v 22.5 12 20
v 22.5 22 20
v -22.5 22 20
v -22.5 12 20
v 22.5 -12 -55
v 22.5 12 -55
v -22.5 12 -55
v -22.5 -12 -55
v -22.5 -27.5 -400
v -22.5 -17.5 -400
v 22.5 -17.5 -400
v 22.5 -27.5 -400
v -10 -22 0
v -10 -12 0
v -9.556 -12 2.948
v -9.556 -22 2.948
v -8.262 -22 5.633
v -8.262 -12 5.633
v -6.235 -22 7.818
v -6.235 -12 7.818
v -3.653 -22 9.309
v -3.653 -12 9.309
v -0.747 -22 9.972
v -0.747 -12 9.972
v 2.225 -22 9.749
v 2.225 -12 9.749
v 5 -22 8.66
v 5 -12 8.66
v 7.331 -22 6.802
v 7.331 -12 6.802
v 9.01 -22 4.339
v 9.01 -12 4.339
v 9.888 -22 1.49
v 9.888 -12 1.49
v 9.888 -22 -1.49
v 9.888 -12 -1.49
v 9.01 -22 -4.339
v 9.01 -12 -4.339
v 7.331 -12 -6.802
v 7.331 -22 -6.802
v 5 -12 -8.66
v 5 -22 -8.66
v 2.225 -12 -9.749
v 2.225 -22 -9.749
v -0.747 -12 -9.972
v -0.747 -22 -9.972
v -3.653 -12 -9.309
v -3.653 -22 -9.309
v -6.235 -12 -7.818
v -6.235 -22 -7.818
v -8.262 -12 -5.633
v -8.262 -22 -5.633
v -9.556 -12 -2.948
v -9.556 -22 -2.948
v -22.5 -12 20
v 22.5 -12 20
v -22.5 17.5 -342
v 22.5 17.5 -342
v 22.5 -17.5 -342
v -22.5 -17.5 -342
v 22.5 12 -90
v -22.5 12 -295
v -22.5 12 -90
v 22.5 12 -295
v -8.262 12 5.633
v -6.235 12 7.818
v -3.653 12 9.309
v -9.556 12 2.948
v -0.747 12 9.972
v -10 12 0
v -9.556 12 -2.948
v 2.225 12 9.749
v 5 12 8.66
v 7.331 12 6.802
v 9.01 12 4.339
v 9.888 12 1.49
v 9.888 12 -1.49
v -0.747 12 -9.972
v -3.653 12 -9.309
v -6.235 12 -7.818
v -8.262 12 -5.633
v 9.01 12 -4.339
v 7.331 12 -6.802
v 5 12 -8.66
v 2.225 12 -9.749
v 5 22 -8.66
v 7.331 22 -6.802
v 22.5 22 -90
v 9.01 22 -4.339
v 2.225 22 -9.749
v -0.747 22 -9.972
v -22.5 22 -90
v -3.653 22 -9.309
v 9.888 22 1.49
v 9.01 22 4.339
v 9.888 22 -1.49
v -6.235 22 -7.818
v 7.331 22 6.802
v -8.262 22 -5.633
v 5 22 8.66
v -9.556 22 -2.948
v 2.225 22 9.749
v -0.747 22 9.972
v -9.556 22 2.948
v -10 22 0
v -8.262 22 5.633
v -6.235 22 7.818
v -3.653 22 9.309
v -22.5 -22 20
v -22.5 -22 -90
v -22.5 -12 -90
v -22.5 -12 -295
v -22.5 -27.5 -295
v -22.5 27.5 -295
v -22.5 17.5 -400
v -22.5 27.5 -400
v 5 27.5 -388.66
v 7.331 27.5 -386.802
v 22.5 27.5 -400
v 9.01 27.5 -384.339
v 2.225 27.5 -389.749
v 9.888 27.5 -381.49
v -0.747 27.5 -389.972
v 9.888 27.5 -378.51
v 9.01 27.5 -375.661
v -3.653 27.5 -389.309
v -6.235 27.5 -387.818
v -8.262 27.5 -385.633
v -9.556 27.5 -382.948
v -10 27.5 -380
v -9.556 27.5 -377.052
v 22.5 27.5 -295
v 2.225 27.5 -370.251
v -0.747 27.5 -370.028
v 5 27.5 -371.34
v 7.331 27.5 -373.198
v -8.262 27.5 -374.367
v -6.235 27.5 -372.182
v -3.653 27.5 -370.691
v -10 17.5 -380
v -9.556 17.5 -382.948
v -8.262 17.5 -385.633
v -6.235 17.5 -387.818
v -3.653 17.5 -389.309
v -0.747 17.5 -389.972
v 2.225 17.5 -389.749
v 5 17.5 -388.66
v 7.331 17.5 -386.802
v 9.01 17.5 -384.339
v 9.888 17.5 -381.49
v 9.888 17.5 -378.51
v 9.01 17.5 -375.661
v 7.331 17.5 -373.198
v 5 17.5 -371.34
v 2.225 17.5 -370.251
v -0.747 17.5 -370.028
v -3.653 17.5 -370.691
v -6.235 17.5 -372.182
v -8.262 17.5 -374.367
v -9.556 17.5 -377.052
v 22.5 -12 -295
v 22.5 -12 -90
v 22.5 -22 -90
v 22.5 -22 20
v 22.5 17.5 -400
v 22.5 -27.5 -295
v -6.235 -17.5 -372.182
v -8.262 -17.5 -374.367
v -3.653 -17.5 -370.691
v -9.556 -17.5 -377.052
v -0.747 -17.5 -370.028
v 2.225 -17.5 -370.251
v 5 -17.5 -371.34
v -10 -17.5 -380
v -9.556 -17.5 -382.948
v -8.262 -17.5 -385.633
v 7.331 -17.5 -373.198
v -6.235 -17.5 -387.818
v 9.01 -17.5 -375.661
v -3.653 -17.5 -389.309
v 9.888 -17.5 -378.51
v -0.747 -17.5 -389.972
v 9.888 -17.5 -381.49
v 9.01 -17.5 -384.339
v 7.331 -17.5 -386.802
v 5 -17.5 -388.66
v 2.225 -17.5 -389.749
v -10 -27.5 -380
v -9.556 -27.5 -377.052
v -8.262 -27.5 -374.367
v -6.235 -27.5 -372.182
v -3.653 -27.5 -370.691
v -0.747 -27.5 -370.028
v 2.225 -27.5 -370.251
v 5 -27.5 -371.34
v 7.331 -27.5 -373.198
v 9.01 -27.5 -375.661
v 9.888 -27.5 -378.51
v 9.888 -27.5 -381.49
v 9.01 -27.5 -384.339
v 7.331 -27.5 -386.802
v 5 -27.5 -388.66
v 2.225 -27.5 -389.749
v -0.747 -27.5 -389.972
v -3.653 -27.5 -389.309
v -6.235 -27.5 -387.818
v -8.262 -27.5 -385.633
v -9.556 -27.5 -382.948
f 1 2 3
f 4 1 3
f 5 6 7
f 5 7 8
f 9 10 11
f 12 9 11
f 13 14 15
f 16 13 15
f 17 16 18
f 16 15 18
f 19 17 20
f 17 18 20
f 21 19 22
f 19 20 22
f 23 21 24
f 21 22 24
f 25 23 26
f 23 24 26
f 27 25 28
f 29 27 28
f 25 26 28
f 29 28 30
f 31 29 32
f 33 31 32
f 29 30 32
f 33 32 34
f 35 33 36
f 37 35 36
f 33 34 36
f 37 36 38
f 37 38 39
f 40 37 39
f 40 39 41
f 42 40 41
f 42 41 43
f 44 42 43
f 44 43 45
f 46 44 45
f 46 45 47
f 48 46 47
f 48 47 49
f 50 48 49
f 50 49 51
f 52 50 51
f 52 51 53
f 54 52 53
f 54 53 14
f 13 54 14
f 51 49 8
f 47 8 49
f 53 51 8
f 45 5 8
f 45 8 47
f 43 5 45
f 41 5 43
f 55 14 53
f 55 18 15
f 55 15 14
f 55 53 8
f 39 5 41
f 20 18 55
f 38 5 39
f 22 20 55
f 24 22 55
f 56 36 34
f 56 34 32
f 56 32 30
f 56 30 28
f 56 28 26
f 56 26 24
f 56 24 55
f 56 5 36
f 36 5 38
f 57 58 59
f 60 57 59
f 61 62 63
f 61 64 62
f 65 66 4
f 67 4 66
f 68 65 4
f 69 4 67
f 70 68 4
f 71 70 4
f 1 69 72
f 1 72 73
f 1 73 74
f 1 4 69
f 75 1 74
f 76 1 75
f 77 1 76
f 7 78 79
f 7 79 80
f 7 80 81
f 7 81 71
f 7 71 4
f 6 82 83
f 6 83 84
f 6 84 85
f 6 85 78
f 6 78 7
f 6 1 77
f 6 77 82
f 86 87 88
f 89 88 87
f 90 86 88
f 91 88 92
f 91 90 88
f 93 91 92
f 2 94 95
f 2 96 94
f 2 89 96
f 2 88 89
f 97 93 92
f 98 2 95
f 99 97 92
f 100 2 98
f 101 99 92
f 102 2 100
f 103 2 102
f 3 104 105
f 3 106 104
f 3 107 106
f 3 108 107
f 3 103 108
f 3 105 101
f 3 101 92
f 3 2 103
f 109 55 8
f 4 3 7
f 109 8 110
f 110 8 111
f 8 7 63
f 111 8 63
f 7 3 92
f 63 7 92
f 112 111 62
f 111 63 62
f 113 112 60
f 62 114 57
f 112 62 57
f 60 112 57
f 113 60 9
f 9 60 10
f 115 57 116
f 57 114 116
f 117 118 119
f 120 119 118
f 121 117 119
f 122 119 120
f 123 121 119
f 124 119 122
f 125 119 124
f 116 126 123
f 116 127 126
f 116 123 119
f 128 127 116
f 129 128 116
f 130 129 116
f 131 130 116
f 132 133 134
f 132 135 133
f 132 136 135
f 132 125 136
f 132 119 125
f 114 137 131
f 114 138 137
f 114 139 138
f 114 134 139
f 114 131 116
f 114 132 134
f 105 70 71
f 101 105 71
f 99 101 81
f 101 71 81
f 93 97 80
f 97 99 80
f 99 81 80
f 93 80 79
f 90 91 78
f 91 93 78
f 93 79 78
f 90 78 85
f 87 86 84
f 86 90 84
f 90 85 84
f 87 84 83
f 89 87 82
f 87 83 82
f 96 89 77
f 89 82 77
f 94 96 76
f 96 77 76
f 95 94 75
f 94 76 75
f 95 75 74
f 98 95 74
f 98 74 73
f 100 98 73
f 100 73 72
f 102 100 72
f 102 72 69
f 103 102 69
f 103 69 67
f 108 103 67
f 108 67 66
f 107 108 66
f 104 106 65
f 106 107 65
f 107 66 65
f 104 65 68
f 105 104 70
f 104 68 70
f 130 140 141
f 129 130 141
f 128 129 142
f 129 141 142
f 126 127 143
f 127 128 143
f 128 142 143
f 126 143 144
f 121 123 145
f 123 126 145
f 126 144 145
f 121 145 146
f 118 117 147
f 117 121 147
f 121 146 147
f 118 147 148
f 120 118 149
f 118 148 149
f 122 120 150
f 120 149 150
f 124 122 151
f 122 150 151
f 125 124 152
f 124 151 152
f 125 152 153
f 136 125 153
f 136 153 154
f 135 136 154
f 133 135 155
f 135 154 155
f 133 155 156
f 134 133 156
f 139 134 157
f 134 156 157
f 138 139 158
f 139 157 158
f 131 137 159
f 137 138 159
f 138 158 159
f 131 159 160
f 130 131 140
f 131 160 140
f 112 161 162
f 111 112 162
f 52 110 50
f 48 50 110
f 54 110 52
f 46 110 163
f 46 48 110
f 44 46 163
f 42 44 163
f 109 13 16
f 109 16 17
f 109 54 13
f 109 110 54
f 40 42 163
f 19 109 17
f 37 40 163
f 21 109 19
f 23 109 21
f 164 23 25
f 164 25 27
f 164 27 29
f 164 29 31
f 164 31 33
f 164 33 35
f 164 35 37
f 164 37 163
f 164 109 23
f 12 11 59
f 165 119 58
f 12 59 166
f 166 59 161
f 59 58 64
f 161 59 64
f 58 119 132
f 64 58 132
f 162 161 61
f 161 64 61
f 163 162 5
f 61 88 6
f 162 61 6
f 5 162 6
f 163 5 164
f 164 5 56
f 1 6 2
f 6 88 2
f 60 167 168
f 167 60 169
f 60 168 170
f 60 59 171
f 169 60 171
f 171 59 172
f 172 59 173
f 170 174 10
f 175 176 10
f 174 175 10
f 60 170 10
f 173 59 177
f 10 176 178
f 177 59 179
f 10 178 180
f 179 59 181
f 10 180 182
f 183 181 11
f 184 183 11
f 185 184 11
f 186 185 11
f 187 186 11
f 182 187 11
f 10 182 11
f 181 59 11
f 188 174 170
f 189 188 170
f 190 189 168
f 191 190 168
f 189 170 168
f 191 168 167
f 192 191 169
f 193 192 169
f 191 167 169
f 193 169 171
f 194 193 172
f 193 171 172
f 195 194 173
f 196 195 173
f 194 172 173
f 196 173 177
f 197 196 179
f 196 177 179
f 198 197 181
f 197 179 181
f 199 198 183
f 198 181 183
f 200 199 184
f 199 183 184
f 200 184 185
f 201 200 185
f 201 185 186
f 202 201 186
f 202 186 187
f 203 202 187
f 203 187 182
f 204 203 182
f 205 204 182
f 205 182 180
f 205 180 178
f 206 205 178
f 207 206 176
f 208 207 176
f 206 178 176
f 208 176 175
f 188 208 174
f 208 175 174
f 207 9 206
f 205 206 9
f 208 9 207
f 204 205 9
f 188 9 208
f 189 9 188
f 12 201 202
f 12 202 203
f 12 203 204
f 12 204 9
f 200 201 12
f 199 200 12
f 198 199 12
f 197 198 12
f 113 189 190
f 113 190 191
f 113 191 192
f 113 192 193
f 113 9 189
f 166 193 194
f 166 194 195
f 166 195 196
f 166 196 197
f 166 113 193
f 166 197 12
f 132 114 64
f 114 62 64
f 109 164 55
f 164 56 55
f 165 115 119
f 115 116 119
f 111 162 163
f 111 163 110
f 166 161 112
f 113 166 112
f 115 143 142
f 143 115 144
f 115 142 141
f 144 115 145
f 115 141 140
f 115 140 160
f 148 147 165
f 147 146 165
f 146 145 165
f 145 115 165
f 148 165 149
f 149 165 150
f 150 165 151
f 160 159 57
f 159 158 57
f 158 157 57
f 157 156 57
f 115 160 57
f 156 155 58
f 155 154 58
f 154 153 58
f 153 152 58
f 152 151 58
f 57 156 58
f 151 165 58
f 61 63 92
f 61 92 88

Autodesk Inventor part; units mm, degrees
ref_plane "YZ Plane" through (0, 0, 0) normal (1, 0, 0) x (0, 1, 0)
ref_plane "XZ Plane" through (0, 0, 0) normal (0, 1, 0) x (-1, 0, 0)
ref_plane "XY Plane" through (0, 0, 0) normal (0, 0, 1) x (1, 0, 0)
sketch "Sketch1" plane through (0, 0, 0) normal (1, 0, 0) x (0, 1, 0)
  circle A0 centre (0, 0) radius 10
  circle A1 centre (-380, 0) radius 10
  line L0 (0, 0) -> (-380, 0) construction
  line L1 (20, 22.5) -> (-400, 22.5)
  line L2 (-400, 22.5) -> (-400, -22.5)
  line L3 (-400, -22.5) -> (20, -22.5)
  line L4 (20, -22.5) -> (20, 22.5)
  line L5 (20, 0) -> (-400, 0) construction
  dimension "d0" = 380
  dimension "d2" = 20
  dimension "d3" = 20
  dimension "d4" = 20
  dimension "d5" = 20
  dimension "d6" = 45
extrude "Extrusion1" add sketch "Sketch1" along normal mid plane 24
sketch "Sketch2" plane through (12, 0, 0) normal (1, 0, 0) x (0, 0, -1)
  circle A0 centre (0, 0) radius 10 projected
  line L0 (22.5, -400) -> (22.5, 20) projected
  line L1 (22.5, 20) -> (-22.5, 20) projected
  line L2 (-22.5, 20) -> (22.5, 20)
  line L3 (22.5, 20) -> (22.5, -90)
  line L4 (22.5, -90) -> (-22.5, -90)
  line L5 (-22.5, -90) -> (-22.5, 20)
  circle A1 centre (0, 0) radius 10
  dimension "d9" = 110
extrude "Extrusion2" add sketch "Sketch2" along normal blind 10
mirror "Mirror1" about plane through (0, 0, 0) normal (1, 0, 0) of "Extrusion2"
sketch "Sketch3" plane through (-12, -400, 22.5) normal (0, 0, 1) x (1, 0, 0)
  line L0 (34, 420) -> (-10, 420) projected
  line L1 (0, 420) -> (24, 420)
  line L2 (24, 420) -> (24, 345)
  line L3 (24, 345) -> (0, 345)
  line L4 (0, 345) -> (0, 420)
  line L5 (12, 420) -> (12, 345) construction
  point P0 (12, 400)
  dimension "d12" = 24
  dimension "d14" = 75
extrude "Extrusion3" cut sketch "Sketch3" against normal through all
sketch "Sketch4" plane through (12, 0, 0) normal (1, 0, 0) x (0, 0, -1)
  line L0 (22.5, -400) -> (22.5, -90) projected
  circle A0 centre (0, -380) radius 10 projected
  line L1 (-22.5, -400) -> (22.5, -400)
  line L2 (22.5, -400) -> (22.5, -295)
  line L3 (22.5, -295) -> (-22.5, -295)
  line L4 (-22.5, -295) -> (-22.5, -400)
  circle A1 centre (0, -380) radius 10
  point P0 (0, 0)
  dimension "d18" = 85
extrude "Extrusion4" add sketch "Sketch4" along normal blind 15.5
mirror "Mirror2" about plane through (0, 0, 0) normal (1, 0, 0) of "Extrusion4"
sketch "Sketch5" plane through (22, -90, 22.5) normal (0, 0, 1) x (1, 0, 0)
  line L0 (-49.5, -310) -> (5.5, -310) projected
  line L1 (-39.5, -310) -> (-4.5, -310)
  line L2 (-4.5, -310) -> (-4.5, -252)
  line L3 (-4.5, -252) -> (-39.5, -252)
  line L4 (-39.5, -252) -> (-39.5, -310)
  line L5 (-22, -252) -> (-22, -310) construction
  point P0 (-22, 90)
  point P1 (-22, -310)
  dimension "d21" = 35
  dimension "d23" = 58
extrude "Extrusion5" cut sketch "Sketch5" against normal through all
move or copy body "Move Body1" bodies to move or copy 1 copy no rotation origin (0, 0, 0) rotation axis (1, 0, 0) rotation angle 90
move or copy body "Move Body2" bodies to move or copy 1 copy no rotation origin (0, 0, 0) rotation axis (0, 0, 1) rotation angle 90
properties part number "LowerLeg_v2"
